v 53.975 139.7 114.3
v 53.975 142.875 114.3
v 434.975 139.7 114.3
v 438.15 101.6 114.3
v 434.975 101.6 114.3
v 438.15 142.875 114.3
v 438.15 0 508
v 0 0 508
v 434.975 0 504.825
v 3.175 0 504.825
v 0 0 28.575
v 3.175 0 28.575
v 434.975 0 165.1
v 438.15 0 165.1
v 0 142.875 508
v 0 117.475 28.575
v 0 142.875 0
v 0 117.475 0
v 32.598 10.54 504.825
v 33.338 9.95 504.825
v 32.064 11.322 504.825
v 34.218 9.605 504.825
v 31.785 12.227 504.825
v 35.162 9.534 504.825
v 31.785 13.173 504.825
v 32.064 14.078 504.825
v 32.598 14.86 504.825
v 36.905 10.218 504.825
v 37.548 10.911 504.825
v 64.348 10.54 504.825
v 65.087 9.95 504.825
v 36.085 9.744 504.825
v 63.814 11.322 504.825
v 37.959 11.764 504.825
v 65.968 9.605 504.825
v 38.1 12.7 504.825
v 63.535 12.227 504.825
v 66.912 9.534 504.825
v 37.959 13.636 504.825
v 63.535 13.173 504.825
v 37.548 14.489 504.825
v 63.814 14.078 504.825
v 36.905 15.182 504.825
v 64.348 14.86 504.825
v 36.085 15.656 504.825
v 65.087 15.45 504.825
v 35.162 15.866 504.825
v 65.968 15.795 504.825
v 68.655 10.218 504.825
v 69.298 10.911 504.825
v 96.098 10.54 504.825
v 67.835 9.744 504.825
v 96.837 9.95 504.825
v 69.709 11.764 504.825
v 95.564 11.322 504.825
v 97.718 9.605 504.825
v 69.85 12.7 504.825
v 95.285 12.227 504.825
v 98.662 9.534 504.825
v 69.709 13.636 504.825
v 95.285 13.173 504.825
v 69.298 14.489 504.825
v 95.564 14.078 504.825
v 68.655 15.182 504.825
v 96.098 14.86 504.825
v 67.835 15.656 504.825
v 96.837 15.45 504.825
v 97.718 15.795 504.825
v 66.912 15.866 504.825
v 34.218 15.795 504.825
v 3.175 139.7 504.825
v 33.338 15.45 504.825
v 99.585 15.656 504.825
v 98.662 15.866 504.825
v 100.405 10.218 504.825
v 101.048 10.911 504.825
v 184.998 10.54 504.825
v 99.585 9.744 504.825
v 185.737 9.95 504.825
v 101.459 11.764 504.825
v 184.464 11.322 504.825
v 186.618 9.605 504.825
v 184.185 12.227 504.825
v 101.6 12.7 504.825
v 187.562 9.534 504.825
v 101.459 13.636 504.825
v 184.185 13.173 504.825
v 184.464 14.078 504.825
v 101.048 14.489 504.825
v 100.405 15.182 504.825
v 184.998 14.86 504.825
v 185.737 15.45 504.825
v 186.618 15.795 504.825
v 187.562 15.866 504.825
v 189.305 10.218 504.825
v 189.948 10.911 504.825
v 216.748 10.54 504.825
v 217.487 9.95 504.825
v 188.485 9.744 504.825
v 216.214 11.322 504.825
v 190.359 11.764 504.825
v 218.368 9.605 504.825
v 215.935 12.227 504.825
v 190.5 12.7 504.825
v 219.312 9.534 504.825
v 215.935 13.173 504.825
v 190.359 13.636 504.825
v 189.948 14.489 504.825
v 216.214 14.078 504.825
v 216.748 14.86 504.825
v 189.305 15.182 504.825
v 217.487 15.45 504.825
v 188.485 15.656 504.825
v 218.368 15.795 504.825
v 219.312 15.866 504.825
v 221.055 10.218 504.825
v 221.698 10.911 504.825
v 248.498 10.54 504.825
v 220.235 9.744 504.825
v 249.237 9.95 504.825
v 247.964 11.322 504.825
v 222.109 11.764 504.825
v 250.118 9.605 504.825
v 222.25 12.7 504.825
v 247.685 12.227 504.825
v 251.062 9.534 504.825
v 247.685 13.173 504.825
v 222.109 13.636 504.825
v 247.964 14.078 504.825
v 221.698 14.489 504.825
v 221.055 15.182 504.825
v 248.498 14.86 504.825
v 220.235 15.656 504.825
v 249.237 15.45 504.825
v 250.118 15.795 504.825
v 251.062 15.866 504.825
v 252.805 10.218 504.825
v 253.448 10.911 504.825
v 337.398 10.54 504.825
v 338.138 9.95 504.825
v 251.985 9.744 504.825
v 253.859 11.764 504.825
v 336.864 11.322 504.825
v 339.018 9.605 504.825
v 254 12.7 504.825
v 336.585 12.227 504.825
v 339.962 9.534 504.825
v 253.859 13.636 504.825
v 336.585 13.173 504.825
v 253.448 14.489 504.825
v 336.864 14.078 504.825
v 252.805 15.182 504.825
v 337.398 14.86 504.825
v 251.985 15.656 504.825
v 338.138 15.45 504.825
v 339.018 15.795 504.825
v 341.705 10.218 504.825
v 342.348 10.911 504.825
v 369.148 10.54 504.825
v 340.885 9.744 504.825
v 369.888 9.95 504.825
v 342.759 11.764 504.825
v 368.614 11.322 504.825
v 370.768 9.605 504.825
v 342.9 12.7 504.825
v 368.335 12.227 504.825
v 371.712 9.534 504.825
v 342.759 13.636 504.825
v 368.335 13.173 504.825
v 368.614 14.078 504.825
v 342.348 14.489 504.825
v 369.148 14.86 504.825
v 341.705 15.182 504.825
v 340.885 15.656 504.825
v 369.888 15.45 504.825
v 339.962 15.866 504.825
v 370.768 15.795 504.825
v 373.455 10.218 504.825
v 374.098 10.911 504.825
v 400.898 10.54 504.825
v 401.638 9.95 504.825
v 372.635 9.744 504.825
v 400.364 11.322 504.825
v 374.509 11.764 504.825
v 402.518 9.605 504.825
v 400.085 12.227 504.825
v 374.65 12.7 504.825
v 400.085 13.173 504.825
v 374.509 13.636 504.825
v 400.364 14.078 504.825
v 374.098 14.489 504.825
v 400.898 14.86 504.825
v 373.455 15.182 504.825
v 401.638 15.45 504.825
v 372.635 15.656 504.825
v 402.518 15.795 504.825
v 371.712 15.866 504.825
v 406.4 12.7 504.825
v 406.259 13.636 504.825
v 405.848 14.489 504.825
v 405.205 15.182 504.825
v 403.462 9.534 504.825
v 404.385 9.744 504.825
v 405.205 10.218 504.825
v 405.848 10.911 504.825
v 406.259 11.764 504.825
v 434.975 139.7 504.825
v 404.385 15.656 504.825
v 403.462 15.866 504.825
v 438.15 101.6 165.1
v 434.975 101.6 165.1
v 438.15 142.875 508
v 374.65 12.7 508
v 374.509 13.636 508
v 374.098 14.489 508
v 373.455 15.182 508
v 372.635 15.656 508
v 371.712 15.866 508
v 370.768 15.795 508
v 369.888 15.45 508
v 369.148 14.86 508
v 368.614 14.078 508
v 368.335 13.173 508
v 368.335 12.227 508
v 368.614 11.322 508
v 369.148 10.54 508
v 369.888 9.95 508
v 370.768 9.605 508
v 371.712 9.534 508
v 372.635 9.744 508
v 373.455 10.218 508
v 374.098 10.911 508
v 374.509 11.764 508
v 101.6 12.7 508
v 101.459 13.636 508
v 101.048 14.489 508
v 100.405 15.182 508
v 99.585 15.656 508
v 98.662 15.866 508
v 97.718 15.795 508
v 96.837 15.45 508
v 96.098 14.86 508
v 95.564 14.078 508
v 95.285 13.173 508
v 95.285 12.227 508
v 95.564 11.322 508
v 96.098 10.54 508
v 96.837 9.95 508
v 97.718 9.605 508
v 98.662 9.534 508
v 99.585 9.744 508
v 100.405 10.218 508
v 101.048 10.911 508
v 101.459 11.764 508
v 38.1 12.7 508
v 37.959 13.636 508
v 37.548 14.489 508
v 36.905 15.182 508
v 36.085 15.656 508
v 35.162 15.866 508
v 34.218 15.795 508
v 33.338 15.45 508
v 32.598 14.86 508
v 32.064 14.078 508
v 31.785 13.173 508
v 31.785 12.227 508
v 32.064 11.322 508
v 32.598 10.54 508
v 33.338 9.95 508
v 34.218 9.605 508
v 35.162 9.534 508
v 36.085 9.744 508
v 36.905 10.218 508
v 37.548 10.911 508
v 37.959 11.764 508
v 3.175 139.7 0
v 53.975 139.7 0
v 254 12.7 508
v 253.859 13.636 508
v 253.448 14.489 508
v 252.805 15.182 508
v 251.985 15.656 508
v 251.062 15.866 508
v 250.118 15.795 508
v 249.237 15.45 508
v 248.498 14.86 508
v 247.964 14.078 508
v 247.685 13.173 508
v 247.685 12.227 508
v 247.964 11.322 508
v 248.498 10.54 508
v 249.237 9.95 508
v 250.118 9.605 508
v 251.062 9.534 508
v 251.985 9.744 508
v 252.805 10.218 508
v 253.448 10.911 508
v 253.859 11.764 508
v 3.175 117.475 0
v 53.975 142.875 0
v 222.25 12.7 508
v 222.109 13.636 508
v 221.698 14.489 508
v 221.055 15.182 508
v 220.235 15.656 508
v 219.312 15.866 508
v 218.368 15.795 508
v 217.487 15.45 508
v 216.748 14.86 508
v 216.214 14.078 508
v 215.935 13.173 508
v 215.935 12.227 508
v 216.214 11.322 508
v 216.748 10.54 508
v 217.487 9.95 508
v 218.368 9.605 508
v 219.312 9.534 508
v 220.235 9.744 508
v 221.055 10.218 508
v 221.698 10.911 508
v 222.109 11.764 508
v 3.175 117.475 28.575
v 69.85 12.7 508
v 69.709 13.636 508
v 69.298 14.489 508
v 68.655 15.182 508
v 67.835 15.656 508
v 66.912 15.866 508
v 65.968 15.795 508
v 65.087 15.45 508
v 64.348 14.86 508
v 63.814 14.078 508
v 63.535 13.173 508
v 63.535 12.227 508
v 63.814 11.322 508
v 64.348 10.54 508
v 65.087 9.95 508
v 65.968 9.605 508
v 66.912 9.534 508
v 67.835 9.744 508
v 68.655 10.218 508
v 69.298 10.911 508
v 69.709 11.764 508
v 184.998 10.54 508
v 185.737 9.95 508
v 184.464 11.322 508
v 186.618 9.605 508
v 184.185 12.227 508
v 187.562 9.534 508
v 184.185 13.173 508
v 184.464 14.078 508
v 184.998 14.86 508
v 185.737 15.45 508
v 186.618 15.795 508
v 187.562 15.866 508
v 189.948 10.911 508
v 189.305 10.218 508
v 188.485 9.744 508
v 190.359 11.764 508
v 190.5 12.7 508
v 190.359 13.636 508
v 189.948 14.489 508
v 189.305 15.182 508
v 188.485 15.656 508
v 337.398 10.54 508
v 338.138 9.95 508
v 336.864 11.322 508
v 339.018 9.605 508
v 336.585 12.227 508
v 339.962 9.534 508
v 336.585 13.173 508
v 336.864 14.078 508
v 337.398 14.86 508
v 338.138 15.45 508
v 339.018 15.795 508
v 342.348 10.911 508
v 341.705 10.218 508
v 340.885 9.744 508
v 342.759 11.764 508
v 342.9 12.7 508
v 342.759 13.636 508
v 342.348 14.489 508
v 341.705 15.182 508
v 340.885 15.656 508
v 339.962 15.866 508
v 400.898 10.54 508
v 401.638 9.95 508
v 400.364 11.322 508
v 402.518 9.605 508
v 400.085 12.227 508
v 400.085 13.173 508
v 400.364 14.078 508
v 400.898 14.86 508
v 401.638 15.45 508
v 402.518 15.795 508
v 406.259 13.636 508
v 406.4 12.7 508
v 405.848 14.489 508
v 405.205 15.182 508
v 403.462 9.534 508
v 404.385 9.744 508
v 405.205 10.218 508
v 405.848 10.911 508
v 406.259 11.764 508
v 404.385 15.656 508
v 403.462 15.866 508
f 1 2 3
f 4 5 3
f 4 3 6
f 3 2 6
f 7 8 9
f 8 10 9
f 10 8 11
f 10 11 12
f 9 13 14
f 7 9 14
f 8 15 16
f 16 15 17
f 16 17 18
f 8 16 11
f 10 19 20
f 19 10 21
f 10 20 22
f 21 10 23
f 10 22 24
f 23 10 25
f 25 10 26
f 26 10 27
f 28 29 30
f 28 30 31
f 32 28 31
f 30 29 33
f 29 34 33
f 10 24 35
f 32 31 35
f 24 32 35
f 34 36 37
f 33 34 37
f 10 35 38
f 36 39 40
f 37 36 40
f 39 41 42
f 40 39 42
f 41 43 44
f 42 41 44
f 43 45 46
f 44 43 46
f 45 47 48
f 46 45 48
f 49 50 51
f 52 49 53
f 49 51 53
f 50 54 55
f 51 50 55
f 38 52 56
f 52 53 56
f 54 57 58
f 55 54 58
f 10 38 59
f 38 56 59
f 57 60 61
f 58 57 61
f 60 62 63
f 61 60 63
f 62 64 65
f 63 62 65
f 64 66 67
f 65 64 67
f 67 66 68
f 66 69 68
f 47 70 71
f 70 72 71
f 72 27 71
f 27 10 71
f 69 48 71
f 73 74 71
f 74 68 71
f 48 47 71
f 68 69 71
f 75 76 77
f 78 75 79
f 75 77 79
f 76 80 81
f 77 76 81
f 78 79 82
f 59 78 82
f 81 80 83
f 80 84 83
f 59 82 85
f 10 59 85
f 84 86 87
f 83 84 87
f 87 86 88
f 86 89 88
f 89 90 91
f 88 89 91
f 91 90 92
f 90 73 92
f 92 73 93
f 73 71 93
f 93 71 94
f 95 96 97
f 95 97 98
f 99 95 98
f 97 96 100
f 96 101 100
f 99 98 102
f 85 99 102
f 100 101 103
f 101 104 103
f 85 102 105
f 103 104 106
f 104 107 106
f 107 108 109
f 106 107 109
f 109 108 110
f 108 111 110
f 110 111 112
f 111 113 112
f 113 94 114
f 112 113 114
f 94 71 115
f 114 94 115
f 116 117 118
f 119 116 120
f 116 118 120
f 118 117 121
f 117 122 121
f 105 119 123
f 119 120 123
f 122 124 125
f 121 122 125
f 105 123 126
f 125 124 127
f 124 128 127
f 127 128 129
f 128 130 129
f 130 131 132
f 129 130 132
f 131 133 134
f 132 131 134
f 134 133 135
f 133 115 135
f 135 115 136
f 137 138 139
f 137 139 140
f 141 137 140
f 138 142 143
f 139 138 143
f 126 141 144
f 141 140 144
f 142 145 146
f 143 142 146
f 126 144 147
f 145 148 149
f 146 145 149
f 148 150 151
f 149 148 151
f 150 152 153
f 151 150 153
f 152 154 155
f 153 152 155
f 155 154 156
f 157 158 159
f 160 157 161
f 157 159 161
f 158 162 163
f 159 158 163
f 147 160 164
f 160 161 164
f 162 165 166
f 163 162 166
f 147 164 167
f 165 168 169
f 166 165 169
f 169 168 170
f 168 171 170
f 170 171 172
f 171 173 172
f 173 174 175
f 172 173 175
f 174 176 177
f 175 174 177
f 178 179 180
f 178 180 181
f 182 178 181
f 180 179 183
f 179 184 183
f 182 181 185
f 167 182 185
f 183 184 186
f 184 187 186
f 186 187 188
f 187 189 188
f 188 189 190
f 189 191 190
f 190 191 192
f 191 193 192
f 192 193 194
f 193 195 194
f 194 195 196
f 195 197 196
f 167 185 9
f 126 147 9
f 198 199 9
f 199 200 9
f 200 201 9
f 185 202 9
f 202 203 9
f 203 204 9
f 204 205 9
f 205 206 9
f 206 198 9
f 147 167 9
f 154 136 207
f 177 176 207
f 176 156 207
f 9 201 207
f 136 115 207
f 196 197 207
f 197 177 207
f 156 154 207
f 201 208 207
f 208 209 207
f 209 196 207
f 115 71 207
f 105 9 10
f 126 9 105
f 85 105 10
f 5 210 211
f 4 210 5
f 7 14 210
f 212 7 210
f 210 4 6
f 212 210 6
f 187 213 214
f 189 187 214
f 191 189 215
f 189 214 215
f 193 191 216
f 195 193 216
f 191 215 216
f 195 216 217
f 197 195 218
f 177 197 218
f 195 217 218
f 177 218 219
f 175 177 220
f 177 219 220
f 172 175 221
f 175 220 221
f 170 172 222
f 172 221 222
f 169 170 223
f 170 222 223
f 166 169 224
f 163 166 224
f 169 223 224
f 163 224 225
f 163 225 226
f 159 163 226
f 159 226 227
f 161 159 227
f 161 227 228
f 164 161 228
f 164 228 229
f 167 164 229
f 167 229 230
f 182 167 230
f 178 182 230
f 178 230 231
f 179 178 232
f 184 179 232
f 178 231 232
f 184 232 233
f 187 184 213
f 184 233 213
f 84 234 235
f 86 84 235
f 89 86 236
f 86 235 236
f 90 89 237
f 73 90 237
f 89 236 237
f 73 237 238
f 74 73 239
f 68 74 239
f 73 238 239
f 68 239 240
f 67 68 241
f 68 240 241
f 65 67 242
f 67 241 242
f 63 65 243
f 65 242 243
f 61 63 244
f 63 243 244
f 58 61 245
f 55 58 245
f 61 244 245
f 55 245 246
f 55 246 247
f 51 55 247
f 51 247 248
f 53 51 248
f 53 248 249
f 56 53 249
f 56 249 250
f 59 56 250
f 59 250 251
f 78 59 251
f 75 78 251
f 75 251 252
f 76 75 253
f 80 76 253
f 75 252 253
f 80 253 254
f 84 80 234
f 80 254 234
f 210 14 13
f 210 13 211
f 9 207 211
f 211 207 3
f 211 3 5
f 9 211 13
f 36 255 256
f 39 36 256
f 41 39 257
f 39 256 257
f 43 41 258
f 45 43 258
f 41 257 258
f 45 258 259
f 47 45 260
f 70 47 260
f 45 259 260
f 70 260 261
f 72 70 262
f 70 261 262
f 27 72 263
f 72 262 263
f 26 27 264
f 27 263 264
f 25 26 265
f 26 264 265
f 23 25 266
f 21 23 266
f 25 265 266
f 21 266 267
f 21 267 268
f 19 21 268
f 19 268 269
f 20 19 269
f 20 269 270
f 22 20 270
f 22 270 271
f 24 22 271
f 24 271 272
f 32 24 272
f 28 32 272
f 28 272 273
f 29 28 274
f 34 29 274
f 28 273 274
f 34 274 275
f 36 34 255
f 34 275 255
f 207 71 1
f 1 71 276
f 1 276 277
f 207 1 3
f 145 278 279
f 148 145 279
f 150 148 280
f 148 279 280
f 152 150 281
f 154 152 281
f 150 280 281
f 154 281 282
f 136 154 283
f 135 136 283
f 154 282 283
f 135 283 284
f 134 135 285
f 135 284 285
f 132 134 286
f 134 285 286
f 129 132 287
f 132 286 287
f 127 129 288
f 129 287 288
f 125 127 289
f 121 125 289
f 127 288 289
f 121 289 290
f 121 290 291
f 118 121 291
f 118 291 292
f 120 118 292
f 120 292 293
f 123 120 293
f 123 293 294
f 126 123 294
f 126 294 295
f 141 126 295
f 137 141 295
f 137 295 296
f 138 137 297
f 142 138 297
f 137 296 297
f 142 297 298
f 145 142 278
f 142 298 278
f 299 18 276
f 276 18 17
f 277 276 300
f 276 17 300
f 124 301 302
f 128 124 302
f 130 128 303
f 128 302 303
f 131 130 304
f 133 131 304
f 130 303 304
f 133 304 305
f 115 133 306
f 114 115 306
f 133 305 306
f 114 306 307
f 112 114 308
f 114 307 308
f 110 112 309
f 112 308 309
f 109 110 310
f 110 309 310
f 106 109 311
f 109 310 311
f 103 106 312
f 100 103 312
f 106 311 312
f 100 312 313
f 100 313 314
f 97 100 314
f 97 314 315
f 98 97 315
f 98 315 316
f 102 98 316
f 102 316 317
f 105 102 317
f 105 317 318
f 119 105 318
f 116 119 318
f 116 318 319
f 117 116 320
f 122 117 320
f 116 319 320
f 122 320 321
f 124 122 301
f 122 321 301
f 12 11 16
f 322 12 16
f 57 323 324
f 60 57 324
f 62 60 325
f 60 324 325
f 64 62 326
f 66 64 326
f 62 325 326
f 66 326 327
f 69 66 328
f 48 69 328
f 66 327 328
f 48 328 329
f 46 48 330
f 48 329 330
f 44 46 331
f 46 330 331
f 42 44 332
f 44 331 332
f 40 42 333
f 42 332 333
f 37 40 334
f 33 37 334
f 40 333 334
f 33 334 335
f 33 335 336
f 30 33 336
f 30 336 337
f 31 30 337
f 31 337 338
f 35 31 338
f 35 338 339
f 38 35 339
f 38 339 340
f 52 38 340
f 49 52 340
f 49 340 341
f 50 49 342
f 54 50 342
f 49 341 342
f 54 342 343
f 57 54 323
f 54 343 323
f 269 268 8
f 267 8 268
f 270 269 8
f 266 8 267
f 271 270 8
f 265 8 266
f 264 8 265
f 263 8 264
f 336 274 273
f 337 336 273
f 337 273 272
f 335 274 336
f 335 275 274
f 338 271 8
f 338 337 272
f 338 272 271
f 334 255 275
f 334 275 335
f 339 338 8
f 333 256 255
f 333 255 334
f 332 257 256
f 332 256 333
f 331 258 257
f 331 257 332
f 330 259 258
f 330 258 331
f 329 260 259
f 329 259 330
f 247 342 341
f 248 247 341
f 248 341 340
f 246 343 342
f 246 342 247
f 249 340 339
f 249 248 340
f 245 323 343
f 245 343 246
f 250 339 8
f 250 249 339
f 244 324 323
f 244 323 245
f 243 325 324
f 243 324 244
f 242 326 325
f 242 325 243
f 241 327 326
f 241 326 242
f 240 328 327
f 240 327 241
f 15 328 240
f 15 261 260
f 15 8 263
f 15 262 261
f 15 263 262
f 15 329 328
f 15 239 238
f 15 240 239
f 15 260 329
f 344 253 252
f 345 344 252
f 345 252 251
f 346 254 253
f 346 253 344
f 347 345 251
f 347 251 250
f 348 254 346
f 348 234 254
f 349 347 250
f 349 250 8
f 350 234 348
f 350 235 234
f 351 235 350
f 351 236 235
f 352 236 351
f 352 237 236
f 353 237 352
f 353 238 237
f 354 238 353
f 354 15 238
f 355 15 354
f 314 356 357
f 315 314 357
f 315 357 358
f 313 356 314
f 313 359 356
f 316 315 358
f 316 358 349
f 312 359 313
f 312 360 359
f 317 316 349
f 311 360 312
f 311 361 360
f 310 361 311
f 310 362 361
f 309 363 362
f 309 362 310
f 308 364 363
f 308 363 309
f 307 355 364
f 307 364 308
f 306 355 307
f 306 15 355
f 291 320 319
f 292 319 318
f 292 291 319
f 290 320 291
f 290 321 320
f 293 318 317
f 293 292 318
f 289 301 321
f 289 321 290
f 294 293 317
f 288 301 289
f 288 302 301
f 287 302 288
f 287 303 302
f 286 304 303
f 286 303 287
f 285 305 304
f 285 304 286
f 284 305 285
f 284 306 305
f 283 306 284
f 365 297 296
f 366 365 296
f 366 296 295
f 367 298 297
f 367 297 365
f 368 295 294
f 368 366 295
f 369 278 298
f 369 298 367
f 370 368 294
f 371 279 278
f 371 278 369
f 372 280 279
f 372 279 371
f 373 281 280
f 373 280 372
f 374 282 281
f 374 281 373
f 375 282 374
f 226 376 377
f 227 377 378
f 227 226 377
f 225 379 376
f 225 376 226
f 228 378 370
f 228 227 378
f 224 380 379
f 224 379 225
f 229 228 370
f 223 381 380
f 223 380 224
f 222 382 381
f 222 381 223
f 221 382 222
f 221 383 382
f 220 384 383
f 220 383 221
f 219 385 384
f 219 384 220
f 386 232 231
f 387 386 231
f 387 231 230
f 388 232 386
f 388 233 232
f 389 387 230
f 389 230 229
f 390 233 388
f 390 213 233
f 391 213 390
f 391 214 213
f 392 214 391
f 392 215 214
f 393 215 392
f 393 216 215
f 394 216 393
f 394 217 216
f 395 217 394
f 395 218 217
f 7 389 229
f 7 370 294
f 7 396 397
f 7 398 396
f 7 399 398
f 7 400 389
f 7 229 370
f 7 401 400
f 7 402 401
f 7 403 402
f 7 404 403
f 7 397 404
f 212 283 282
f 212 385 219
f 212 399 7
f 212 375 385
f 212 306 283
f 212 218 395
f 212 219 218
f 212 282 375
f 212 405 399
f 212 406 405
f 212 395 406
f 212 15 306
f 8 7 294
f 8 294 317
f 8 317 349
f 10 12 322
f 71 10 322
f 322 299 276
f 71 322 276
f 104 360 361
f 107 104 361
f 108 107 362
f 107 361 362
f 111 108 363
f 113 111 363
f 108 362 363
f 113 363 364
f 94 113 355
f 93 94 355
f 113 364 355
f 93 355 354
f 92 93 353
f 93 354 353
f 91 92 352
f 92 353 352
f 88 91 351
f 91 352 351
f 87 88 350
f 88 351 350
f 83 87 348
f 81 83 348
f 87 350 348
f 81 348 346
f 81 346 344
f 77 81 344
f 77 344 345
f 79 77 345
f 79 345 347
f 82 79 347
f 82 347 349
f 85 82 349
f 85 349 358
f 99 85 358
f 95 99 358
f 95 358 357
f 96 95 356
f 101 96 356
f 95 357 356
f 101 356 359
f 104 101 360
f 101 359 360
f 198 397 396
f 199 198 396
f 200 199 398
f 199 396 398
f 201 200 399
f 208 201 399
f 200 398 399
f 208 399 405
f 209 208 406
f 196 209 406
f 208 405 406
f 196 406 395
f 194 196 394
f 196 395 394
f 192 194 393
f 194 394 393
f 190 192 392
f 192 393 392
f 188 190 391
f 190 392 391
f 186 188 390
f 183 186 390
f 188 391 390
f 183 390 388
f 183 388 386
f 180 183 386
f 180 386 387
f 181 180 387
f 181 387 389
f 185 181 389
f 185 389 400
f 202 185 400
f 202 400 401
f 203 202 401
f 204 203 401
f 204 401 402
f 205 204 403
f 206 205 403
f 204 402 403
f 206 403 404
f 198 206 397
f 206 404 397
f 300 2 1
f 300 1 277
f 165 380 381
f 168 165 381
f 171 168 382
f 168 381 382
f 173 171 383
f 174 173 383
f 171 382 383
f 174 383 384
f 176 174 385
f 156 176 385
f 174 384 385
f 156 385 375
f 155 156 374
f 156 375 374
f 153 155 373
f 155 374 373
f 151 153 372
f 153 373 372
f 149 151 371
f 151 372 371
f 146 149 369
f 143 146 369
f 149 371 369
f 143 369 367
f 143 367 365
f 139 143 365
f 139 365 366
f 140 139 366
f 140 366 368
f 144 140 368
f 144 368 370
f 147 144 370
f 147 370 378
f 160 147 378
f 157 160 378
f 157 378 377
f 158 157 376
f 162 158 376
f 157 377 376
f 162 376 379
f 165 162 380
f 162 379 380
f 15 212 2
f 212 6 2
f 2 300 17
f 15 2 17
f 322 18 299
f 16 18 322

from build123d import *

# Parameters (mm, degrees)
BOSS_EXTRUDE1_DEPTH = 508
SKETCH2_W           = 438.15
SKETCH2_H           = 142.875
BOSS_EXTRUDE2_DEPTH = 3.175
SKETCH4_W           = 384.175
SKETCH4_H           = 114.3
CUT_EXTRUDE1_DEPTH  = 686.895537327
CUT_EXTRUDE2_REACH  = 687.896
SKETCH5_W           = 50.8
SKETCH5_H           = 101.6
CUT_EXTRUDE3_REACH  = 687.896
SKETCH6_W           = 28.575
SKETCH6_H           = 117.475
SKETCH7_R           = 3.175
CUT_EXTRUDE4_DEPTH  = 3.175


with BuildPart() as part:
    # Sketch1 → Boss-Extrude1 (new body)
    with BuildSketch(Plane.XY):
        Polygon((0, 0), (3.175, 0), (3.175, 139.7), (434.975, 139.7), (434.975, 0), (438.15, 0), (438.15, 142.875), (0, 142.875), align=None)
    extrude(amount=BOSS_EXTRUDE1_DEPTH)

    # Sketch2 → Boss-Extrude2 (add)
    with BuildSketch(Plane.XY.offset(508)):
        with Locations((219.075, 71.4375)):
            Rectangle(SKETCH2_W, SKETCH2_H)
    extrude(amount=-BOSS_EXTRUDE2_DEPTH)

    # Sketch4 → Cut-Extrude1 (cut, through all)
    with BuildSketch(Plane(origin=(0, 142.875, 0), x_dir=(1, 0, 0), z_dir=(0, 1, 0))):
        with Locations((246.0625, -57.15)):
            Rectangle(SKETCH4_W, SKETCH4_H)
    extrude(amount=-CUT_EXTRUDE1_DEPTH, mode=Mode.SUBTRACT)

    # Sketch5 → Cut-Extrude2 (cut, up to next)
    with BuildSketch(Plane(origin=(438.15, 0, 0), x_dir=(0, 0, -1), z_dir=(1, 0, 0)), mode=Mode.PRIVATE) as cut_extrude2_sk1:
        with Locations((-139.7, 50.8)):
            Rectangle(SKETCH5_W, SKETCH5_H)
    cut_extrude2_tool1 = extrude(cut_extrude2_sk1.sketch, amount=-CUT_EXTRUDE2_REACH, mode=Mode.PRIVATE) & part.part
    add(cut_extrude2_tool1.solids().sort_by_distance((438.15, 50.8, 139.7))[0], mode=Mode.SUBTRACT)

    # Sketch6 → Cut-Extrude3 (cut, up to next)
    with BuildSketch(Plane.ZY, mode=Mode.PRIVATE) as cut_extrude3_sk1:
        with Locations((14.2875, 58.7375)):
            Rectangle(SKETCH6_W, SKETCH6_H)
    cut_extrude3_tool1 = extrude(cut_extrude3_sk1.sketch, amount=-CUT_EXTRUDE3_REACH, mode=Mode.PRIVATE) & part.part
    add(cut_extrude3_tool1.solids().sort_by_distance((0, 58.7375, 14.2875))[0], mode=Mode.SUBTRACT)

    # Sketch7 → Cut-Extrude4 (cut)
    with BuildSketch(Plane.XY.offset(508)):
        with Locations((219.075, 12.7)):
            Circle(SKETCH7_R)
        with Locations((187.325, 12.7)):
            Circle(SKETCH7_R)
        with Locations((34.925, 12.7)):
            Circle(SKETCH7_R)
        with Locations((66.675, 12.7)):
            Circle(SKETCH7_R)
        with Locations((98.425, 12.7)):
            Circle(SKETCH7_R)
        with Locations((250.825, 12.7)):
            Circle(SKETCH7_R)
        with Locations((339.725, 12.7)):
            Circle(SKETCH7_R)
        with Locations((371.475, 12.7)):
            Circle(SKETCH7_R)
        with Locations((403.225, 12.7)):
            Circle(SKETCH7_R)
    extrude(amount=-CUT_EXTRUDE4_DEPTH, mode=Mode.SUBTRACT)


solid = part.part
